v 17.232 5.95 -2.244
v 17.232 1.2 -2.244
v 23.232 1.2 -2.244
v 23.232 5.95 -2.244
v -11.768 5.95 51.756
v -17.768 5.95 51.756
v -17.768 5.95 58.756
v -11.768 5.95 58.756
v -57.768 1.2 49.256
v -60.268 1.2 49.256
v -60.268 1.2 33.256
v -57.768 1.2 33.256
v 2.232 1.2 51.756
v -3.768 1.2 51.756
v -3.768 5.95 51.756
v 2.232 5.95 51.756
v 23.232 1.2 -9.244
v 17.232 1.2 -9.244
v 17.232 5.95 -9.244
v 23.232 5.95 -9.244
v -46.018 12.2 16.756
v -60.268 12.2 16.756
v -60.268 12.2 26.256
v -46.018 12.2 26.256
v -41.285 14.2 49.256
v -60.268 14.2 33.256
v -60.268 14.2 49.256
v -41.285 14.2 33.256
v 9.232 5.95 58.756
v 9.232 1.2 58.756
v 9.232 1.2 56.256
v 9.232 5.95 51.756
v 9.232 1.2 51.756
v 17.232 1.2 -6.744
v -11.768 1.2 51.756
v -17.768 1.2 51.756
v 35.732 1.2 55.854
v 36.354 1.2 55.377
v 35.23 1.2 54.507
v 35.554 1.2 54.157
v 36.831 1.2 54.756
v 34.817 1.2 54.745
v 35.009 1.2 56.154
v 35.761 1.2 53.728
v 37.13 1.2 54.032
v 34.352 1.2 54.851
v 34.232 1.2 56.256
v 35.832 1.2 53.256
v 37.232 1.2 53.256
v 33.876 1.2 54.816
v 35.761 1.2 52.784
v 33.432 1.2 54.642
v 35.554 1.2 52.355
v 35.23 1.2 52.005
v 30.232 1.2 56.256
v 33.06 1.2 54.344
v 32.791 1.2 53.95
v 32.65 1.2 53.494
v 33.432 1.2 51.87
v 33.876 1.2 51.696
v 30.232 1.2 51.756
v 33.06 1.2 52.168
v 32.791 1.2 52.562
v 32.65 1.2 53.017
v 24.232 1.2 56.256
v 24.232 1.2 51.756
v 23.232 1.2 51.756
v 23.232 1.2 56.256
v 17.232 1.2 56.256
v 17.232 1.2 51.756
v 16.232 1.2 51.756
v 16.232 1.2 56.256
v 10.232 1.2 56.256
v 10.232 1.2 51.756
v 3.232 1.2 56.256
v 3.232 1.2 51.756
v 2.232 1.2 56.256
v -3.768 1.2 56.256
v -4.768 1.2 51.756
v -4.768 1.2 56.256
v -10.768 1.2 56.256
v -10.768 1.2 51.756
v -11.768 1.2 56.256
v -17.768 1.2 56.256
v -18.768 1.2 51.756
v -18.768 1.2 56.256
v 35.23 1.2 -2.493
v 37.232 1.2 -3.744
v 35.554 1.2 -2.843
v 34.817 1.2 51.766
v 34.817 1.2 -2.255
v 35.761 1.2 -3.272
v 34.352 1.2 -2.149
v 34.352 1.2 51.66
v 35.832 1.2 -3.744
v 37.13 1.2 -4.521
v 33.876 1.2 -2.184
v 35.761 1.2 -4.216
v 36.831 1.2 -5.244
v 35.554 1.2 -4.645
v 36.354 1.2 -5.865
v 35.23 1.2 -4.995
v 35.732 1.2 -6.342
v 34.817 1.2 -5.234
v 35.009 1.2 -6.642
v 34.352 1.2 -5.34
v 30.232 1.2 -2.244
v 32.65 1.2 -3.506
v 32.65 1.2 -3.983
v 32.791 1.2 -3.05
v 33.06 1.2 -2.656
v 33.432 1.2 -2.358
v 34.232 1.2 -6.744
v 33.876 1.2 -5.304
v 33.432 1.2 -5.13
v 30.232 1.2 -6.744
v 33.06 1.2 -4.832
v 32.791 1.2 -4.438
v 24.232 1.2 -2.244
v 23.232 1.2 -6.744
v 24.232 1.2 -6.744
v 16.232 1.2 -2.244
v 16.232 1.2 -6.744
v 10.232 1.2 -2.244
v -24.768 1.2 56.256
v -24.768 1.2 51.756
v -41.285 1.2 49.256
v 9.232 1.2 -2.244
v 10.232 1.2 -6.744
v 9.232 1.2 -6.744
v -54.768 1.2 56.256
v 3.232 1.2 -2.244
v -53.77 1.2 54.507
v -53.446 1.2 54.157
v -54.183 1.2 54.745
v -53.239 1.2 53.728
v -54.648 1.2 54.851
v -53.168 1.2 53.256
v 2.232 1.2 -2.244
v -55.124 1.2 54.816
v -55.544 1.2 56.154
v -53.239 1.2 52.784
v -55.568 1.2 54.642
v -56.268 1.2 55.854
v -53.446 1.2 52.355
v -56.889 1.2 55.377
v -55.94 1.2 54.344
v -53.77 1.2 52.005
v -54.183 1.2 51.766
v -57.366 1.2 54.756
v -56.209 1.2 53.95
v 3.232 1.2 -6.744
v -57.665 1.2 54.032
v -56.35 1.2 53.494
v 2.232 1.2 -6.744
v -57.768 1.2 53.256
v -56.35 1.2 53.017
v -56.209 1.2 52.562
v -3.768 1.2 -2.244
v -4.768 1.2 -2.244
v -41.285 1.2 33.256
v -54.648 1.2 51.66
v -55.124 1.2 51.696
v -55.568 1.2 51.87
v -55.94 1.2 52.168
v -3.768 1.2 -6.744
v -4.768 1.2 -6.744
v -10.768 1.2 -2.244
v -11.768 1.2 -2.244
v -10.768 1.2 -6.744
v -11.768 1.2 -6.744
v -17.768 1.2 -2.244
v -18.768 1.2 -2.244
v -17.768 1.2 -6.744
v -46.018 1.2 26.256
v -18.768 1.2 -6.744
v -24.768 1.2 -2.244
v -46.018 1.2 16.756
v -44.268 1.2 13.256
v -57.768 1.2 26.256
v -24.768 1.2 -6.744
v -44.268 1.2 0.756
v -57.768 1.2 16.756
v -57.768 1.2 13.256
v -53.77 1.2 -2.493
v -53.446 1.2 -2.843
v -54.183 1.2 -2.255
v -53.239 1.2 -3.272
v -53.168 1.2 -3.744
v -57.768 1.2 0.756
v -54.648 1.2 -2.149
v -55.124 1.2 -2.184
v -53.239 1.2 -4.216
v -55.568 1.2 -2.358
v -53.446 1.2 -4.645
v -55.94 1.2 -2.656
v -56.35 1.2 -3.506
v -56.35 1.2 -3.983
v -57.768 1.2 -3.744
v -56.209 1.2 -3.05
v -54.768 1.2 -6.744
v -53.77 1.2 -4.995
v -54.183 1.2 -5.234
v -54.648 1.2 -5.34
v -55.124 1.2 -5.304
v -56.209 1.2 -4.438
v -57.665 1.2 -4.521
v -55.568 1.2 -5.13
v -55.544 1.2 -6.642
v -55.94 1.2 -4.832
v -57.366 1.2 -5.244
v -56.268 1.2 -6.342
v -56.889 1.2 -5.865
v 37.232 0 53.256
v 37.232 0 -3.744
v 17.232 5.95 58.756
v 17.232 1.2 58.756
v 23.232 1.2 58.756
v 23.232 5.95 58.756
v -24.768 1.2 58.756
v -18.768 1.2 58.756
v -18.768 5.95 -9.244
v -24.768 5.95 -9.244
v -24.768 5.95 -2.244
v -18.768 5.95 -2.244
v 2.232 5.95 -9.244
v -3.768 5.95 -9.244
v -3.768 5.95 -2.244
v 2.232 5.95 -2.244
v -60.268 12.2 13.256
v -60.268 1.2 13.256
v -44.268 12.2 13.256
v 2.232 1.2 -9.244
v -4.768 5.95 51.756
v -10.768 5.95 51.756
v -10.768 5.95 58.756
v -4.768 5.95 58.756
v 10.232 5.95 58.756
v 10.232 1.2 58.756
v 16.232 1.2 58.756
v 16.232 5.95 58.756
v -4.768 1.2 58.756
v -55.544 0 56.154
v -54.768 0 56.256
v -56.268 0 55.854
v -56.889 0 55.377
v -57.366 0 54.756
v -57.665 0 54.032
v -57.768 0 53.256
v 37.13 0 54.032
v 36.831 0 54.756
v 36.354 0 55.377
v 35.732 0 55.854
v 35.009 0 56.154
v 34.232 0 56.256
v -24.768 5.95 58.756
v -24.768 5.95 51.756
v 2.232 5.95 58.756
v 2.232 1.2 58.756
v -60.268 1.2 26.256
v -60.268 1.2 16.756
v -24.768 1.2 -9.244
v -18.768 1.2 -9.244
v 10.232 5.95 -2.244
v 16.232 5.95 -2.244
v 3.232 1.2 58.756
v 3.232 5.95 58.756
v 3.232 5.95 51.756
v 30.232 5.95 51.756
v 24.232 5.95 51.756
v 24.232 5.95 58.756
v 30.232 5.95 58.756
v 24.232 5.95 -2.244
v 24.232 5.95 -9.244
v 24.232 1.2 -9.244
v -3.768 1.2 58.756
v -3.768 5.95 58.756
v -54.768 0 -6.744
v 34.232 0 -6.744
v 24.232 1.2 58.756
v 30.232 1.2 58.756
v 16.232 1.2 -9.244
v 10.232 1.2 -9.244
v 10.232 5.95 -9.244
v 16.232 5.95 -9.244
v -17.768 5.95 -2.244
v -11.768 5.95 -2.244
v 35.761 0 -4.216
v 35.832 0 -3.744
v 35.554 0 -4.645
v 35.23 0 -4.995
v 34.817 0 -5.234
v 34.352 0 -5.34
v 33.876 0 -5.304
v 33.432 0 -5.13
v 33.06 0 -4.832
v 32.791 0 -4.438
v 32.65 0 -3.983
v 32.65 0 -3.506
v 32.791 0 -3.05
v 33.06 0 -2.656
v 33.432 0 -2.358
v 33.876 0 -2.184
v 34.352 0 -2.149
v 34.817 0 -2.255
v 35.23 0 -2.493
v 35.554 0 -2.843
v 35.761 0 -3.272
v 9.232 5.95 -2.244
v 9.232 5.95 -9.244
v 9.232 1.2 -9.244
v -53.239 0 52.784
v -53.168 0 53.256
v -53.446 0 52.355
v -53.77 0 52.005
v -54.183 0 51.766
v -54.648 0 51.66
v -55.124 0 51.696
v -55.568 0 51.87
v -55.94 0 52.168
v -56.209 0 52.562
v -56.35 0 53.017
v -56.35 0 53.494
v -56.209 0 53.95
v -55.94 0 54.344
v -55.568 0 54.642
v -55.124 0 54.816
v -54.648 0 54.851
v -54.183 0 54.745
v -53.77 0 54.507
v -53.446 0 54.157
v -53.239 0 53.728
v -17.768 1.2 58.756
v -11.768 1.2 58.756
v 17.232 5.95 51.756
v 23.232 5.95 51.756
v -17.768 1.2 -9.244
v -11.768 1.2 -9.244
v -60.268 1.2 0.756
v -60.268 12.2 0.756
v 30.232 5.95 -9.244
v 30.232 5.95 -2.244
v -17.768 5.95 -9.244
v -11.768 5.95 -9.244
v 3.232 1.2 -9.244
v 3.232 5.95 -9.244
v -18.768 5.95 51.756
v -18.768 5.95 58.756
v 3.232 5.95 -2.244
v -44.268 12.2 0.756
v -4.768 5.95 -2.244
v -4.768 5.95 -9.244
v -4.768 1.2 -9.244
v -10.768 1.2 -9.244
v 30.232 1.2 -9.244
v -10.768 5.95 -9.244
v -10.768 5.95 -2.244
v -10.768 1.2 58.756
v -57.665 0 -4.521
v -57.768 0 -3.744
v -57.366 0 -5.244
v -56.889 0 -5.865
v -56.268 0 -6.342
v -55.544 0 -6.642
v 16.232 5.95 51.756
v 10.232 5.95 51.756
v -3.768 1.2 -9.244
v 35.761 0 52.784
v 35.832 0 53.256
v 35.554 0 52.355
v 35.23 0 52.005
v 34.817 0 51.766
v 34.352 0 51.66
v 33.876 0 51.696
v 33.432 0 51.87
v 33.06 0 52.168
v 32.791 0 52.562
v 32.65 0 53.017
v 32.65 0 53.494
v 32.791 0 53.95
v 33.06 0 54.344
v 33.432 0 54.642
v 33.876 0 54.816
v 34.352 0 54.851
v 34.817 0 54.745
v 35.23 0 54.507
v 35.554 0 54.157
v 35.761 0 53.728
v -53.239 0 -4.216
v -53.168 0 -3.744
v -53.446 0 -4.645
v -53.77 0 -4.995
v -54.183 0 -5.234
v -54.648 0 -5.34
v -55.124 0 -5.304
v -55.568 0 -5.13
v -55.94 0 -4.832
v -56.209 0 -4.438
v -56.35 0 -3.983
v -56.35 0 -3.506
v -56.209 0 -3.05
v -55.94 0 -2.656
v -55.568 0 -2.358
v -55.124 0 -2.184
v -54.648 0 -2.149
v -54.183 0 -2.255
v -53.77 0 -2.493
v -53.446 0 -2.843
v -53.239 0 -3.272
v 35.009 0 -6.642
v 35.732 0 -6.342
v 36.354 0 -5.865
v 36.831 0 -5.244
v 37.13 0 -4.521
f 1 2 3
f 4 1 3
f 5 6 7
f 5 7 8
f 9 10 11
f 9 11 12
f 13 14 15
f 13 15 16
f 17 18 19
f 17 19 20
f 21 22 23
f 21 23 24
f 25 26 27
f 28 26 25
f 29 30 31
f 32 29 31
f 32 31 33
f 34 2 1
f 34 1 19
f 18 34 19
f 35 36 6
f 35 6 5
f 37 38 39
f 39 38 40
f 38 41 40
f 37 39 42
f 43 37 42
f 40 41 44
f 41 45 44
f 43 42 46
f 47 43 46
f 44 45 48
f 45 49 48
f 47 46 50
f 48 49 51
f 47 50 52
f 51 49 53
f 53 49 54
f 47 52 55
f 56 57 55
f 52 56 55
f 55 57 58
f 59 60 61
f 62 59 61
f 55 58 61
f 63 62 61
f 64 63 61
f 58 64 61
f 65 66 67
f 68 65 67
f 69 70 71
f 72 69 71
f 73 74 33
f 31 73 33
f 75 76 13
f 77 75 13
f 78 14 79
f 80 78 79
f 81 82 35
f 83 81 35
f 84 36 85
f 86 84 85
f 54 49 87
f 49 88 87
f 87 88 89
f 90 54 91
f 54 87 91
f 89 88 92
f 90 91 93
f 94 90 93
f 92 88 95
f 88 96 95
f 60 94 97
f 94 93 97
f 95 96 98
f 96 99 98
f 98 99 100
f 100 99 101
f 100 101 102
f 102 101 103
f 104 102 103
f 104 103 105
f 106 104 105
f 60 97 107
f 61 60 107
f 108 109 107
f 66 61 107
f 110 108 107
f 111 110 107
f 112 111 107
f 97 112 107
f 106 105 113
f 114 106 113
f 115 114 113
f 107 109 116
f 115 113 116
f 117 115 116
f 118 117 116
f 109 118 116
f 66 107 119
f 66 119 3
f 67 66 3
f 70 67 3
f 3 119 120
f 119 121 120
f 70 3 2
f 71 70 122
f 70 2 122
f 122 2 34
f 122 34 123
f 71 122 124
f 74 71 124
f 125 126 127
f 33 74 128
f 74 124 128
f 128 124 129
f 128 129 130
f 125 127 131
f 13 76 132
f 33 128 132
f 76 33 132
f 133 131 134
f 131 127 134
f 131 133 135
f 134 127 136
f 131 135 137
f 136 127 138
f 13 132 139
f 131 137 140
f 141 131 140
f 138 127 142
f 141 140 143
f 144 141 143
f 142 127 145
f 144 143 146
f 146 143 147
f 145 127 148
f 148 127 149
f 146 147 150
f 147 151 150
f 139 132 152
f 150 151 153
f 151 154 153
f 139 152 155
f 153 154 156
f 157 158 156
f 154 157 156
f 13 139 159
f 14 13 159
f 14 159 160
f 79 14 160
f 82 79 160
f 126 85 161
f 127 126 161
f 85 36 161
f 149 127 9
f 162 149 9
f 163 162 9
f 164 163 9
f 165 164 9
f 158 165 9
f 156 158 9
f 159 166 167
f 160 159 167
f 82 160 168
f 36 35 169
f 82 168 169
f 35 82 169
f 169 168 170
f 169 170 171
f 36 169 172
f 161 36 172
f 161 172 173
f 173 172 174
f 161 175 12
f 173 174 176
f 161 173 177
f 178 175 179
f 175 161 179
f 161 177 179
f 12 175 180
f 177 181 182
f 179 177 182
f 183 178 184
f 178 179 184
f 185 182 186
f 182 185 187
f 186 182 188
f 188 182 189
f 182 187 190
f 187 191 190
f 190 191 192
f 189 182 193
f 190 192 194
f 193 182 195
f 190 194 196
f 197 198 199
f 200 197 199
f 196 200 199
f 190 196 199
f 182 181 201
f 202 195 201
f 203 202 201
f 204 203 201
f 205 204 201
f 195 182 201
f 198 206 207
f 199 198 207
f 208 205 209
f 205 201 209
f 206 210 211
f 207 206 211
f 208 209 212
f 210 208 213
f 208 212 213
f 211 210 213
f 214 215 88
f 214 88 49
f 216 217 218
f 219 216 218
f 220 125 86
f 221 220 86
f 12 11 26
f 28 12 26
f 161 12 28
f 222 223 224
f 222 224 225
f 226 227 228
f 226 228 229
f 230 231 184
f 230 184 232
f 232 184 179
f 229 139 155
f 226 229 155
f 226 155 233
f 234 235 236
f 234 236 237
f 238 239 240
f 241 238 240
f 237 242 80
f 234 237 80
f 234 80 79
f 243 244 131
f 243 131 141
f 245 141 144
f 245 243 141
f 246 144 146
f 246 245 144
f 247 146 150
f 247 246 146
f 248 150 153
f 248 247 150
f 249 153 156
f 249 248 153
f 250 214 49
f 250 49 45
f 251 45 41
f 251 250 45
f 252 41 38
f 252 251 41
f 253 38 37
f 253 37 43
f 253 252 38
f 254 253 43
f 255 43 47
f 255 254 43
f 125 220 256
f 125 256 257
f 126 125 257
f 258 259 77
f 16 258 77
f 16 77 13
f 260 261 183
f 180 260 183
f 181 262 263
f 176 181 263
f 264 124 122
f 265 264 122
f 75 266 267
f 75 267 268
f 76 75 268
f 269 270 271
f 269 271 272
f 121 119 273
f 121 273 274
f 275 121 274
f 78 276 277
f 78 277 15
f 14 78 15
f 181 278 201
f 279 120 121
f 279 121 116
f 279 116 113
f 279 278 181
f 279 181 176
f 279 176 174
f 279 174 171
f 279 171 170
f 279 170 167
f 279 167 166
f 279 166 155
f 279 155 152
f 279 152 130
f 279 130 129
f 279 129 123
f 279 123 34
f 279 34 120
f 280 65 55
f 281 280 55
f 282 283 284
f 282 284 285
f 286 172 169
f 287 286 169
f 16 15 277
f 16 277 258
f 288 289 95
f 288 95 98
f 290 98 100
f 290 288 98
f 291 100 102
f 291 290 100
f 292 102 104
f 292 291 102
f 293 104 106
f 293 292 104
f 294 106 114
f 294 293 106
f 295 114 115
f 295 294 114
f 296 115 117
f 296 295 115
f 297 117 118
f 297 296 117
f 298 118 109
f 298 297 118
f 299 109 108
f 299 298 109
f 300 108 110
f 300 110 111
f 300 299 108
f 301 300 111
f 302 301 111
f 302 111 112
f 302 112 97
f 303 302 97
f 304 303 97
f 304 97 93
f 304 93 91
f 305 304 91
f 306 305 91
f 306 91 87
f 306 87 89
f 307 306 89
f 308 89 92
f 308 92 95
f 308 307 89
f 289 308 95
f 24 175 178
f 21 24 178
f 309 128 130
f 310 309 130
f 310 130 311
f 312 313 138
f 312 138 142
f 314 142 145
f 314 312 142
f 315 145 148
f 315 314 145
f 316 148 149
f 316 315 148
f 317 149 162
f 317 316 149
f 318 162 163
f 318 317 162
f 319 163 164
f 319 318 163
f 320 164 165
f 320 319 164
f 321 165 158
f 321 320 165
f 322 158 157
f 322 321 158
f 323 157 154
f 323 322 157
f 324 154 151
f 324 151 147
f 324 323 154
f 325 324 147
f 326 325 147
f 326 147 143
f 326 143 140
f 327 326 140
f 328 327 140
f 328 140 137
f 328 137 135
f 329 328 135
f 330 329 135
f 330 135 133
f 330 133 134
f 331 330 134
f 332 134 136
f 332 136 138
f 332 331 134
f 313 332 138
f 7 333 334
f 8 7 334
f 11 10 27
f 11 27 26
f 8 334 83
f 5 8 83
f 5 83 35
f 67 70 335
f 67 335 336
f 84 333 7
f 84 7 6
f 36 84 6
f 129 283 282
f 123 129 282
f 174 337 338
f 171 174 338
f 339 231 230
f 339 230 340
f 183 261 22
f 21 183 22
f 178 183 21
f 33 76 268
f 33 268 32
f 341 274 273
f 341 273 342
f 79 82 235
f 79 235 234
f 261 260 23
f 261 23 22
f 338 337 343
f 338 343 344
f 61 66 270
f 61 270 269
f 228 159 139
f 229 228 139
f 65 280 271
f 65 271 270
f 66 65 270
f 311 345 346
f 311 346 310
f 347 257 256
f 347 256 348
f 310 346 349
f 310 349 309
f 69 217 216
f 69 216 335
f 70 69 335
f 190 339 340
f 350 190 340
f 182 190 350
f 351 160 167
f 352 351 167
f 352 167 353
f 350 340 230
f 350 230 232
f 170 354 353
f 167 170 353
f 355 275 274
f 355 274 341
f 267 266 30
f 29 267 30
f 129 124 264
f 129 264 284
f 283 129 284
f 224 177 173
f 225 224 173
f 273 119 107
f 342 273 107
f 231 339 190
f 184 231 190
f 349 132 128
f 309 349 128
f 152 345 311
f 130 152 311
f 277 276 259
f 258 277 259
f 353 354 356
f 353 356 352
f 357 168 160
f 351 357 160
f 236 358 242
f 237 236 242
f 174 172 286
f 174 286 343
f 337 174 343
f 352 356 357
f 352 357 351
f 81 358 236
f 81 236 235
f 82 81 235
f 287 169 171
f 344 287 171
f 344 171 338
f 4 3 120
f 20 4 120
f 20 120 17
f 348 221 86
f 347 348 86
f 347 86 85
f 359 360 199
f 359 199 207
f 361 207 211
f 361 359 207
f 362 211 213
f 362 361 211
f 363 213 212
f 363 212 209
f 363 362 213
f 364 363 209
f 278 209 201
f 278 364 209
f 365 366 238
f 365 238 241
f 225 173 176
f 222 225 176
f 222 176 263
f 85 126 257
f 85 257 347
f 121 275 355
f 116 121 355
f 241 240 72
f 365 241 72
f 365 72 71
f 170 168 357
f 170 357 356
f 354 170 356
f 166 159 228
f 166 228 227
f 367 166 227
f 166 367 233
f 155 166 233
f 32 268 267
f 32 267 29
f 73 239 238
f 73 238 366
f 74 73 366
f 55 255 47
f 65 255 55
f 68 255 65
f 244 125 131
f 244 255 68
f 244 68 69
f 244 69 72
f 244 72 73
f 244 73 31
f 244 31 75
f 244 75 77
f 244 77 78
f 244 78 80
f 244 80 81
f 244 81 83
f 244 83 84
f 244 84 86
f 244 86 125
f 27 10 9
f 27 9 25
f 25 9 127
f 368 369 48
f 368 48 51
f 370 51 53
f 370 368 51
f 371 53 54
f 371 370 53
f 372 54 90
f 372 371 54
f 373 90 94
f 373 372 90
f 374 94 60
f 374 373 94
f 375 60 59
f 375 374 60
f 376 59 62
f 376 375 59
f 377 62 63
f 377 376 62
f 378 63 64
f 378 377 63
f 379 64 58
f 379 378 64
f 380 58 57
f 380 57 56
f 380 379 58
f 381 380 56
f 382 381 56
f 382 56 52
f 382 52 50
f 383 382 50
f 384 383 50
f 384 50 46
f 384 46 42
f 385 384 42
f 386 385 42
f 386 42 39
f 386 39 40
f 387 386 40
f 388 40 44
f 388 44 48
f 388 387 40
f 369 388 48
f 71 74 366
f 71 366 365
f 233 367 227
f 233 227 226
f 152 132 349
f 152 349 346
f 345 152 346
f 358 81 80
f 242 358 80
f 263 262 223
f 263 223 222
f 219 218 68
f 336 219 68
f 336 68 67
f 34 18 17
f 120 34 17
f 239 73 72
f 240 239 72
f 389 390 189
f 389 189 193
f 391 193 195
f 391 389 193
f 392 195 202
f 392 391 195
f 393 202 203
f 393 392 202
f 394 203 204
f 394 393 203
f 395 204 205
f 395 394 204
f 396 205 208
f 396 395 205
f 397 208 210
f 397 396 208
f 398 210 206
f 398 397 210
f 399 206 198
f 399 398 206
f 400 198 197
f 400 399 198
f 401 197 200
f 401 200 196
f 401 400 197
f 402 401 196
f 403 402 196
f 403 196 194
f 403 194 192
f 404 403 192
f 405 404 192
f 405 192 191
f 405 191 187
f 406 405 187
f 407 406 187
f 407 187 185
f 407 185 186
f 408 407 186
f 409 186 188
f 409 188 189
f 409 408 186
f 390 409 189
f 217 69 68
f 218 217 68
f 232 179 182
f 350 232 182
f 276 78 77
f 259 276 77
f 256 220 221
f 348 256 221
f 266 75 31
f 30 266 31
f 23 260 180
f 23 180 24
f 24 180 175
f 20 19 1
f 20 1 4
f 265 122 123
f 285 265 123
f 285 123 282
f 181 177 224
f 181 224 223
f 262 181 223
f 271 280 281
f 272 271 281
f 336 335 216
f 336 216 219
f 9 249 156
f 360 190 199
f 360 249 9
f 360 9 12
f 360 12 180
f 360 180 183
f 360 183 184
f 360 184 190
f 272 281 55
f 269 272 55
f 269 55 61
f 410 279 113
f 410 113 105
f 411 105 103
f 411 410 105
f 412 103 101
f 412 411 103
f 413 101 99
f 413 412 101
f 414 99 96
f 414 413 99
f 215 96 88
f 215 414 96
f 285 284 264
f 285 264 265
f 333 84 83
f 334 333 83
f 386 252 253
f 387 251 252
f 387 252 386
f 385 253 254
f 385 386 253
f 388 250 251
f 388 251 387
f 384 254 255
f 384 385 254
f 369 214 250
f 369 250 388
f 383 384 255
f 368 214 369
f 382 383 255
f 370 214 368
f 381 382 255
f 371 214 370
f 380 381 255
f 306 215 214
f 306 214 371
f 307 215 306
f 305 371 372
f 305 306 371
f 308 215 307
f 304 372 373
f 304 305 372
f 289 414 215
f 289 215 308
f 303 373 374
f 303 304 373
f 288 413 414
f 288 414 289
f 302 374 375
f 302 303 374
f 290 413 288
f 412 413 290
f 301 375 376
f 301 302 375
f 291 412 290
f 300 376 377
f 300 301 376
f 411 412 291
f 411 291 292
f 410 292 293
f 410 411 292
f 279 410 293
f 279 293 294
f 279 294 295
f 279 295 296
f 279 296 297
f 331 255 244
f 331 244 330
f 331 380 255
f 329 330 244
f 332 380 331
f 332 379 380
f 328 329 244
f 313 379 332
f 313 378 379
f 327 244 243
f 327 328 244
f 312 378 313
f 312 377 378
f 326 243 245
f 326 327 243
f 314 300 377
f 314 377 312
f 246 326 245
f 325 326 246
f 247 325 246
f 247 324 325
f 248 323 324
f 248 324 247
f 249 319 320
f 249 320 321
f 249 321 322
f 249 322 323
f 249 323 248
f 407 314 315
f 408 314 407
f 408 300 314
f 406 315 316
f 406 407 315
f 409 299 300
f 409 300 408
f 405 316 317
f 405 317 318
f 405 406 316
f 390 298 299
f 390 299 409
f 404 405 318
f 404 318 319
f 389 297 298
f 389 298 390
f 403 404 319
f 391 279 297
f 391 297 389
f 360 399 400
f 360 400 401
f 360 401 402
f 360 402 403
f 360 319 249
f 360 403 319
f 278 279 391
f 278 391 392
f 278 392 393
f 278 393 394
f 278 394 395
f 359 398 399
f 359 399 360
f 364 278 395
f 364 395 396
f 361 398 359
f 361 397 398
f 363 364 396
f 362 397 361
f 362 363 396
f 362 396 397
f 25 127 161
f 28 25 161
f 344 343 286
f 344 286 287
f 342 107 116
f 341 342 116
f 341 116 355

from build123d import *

# Parameters (mm, degrees)
SKETCH1_R            = 1.6
PCB_DEPTH            = 1.2
SKETCH2_W            = 6
SKETCH2_H            = 7
POP_CONNECTORS_DEPTH = 4.75
USB_W                = 16
USB_H                = 12.5
USB_B_DEPTH          = 11
SKETCH4_W            = 14.25
SKETCH4_H            = 9.5
DC_POWER_DEPTH       = 11
SKETCH5_W            = 18.982296278
SKETCH5_H            = 16
RJ45_DEPTH           = 13


with BuildPart() as part:
    # Sketch1 → pcb (new body)
    with BuildSketch(Plane(origin=(0, 0, 0), x_dir=(1, 0, 0), z_dir=(0, 1, 0))):
        with BuildLine():
            Line((-54.767524261, 6.744107228), (34.232475739, 6.744107228))
            ThreePointArc((34.232475739, 6.744107228), (36.353796082, 5.865427572), (37.232475739, 3.744107228))
            Line((37.232475739, 3.744107228), (37.232475739, -53.255892772))
            ThreePointArc((37.232475739, -53.255892772), (36.353796082, -55.377213115), (34.232475739, -56.255892772))
            Line((34.232475739, -56.255892772), (-54.767524261, -56.255892772))
            ThreePointArc((-54.767524261, -56.255892772), (-56.888844605, -55.377213115), (-57.767524261, -53.255892772))
            Line((-57.767524261, -53.255892772), (-57.767524261, 3.744107228))
            ThreePointArc((-57.767524261, 3.744107228), (-56.888844605, 5.865427572), (-54.767524261, 6.744107228))
        make_face()
        with Locations((-54.767524261, 3.744107228)):
            Circle(SKETCH1_R, mode=Mode.SUBTRACT)
        with Locations((-54.767524261, -53.255892772)):
            Circle(SKETCH1_R, mode=Mode.SUBTRACT)
        with Locations((34.232475739, -53.255892772)):
            Circle(SKETCH1_R, mode=Mode.SUBTRACT)
        with Locations((34.232475739, 3.744107228)):
            Circle(SKETCH1_R, mode=Mode.SUBTRACT)
    extrude(amount=PCB_DEPTH)

    # Sketch2 → pop connectors (add)
    with BuildSketch(Plane(origin=(0, 1.2, 0), x_dir=(1, 0, 0), z_dir=(0, 1, 0))):
        with Locations((-14.767524261, -55.255892772)):
            Rectangle(SKETCH2_W, SKETCH2_H)
        with Locations((-21.767524261, -55.255892772)):
            Rectangle(SKETCH2_W, SKETCH2_H)
        with Locations((-7.767524261, -55.255892772)):
            Rectangle(SKETCH2_W, SKETCH2_H)
        with Locations((-0.767524261, -55.255892772)):
            Rectangle(SKETCH2_W, SKETCH2_H)
        with Locations((6.232475739, -55.255892772)):
            Rectangle(SKETCH2_W, SKETCH2_H)
        with Locations((13.232475739, -55.255892772)):
            Rectangle(SKETCH2_W, SKETCH2_H)
        with Locations((20.232475739, -55.255892772)):
            Rectangle(SKETCH2_W, SKETCH2_H)
        with Locations((27.232475739, -55.255892772)):
            Rectangle(SKETCH2_W, SKETCH2_H)
        with Locations((27.232475739, 5.744107228)):
            Rectangle(SKETCH2_W, SKETCH2_H)
        with Locations((20.232475739, 5.744107228)):
            Rectangle(SKETCH2_W, SKETCH2_H)
        with Locations((13.232475739, 5.744107228)):
            Rectangle(SKETCH2_W, SKETCH2_H)
        with Locations((6.232475739, 5.744107228)):
            Rectangle(SKETCH2_W, SKETCH2_H)
        with Locations((-0.767524261, 5.744107228)):
            Rectangle(SKETCH2_W, SKETCH2_H)
        with Locations((-7.767524261, 5.744107228)):
            Rectangle(SKETCH2_W, SKETCH2_H)
        with Locations((-14.767524261, 5.744107228)):
            Rectangle(SKETCH2_W, SKETCH2_H)
        with Locations((-21.767524261, 5.744107228)):
            Rectangle(SKETCH2_W, SKETCH2_H)
    extrude(amount=POP_CONNECTORS_DEPTH)

    # usb → USB B (add)
    with BuildSketch(Plane(origin=(0, 1.2, 0), x_dir=(1, 0, 0), z_dir=(0, 1, 0))):
        with Locations((-52.267524261, -7.005892772)):
            Rectangle(USB_W, USB_H)
    extrude(amount=USB_B_DEPTH)

    # Sketch4 → DC power (add)
    with BuildSketch(Plane(origin=(0, 1.2, 0), x_dir=(1, 0, 0), z_dir=(0, 1, 0))):
        with Locations((-53.142524261, -21.505892772)):
            Rectangle(SKETCH4_W, SKETCH4_H)
    extrude(amount=DC_POWER_DEPTH)

    # Sketch5 → RJ45 (add)
    with BuildSketch(Plane(origin=(0, 1.2, 0), x_dir=(1, 0, 0), z_dir=(0, 1, 0))):
        with Locations((-50.776376122, -41.255892772)):
            Rectangle(SKETCH5_W, SKETCH5_H)
    extrude(amount=RJ45_DEPTH)


solid = part.part
